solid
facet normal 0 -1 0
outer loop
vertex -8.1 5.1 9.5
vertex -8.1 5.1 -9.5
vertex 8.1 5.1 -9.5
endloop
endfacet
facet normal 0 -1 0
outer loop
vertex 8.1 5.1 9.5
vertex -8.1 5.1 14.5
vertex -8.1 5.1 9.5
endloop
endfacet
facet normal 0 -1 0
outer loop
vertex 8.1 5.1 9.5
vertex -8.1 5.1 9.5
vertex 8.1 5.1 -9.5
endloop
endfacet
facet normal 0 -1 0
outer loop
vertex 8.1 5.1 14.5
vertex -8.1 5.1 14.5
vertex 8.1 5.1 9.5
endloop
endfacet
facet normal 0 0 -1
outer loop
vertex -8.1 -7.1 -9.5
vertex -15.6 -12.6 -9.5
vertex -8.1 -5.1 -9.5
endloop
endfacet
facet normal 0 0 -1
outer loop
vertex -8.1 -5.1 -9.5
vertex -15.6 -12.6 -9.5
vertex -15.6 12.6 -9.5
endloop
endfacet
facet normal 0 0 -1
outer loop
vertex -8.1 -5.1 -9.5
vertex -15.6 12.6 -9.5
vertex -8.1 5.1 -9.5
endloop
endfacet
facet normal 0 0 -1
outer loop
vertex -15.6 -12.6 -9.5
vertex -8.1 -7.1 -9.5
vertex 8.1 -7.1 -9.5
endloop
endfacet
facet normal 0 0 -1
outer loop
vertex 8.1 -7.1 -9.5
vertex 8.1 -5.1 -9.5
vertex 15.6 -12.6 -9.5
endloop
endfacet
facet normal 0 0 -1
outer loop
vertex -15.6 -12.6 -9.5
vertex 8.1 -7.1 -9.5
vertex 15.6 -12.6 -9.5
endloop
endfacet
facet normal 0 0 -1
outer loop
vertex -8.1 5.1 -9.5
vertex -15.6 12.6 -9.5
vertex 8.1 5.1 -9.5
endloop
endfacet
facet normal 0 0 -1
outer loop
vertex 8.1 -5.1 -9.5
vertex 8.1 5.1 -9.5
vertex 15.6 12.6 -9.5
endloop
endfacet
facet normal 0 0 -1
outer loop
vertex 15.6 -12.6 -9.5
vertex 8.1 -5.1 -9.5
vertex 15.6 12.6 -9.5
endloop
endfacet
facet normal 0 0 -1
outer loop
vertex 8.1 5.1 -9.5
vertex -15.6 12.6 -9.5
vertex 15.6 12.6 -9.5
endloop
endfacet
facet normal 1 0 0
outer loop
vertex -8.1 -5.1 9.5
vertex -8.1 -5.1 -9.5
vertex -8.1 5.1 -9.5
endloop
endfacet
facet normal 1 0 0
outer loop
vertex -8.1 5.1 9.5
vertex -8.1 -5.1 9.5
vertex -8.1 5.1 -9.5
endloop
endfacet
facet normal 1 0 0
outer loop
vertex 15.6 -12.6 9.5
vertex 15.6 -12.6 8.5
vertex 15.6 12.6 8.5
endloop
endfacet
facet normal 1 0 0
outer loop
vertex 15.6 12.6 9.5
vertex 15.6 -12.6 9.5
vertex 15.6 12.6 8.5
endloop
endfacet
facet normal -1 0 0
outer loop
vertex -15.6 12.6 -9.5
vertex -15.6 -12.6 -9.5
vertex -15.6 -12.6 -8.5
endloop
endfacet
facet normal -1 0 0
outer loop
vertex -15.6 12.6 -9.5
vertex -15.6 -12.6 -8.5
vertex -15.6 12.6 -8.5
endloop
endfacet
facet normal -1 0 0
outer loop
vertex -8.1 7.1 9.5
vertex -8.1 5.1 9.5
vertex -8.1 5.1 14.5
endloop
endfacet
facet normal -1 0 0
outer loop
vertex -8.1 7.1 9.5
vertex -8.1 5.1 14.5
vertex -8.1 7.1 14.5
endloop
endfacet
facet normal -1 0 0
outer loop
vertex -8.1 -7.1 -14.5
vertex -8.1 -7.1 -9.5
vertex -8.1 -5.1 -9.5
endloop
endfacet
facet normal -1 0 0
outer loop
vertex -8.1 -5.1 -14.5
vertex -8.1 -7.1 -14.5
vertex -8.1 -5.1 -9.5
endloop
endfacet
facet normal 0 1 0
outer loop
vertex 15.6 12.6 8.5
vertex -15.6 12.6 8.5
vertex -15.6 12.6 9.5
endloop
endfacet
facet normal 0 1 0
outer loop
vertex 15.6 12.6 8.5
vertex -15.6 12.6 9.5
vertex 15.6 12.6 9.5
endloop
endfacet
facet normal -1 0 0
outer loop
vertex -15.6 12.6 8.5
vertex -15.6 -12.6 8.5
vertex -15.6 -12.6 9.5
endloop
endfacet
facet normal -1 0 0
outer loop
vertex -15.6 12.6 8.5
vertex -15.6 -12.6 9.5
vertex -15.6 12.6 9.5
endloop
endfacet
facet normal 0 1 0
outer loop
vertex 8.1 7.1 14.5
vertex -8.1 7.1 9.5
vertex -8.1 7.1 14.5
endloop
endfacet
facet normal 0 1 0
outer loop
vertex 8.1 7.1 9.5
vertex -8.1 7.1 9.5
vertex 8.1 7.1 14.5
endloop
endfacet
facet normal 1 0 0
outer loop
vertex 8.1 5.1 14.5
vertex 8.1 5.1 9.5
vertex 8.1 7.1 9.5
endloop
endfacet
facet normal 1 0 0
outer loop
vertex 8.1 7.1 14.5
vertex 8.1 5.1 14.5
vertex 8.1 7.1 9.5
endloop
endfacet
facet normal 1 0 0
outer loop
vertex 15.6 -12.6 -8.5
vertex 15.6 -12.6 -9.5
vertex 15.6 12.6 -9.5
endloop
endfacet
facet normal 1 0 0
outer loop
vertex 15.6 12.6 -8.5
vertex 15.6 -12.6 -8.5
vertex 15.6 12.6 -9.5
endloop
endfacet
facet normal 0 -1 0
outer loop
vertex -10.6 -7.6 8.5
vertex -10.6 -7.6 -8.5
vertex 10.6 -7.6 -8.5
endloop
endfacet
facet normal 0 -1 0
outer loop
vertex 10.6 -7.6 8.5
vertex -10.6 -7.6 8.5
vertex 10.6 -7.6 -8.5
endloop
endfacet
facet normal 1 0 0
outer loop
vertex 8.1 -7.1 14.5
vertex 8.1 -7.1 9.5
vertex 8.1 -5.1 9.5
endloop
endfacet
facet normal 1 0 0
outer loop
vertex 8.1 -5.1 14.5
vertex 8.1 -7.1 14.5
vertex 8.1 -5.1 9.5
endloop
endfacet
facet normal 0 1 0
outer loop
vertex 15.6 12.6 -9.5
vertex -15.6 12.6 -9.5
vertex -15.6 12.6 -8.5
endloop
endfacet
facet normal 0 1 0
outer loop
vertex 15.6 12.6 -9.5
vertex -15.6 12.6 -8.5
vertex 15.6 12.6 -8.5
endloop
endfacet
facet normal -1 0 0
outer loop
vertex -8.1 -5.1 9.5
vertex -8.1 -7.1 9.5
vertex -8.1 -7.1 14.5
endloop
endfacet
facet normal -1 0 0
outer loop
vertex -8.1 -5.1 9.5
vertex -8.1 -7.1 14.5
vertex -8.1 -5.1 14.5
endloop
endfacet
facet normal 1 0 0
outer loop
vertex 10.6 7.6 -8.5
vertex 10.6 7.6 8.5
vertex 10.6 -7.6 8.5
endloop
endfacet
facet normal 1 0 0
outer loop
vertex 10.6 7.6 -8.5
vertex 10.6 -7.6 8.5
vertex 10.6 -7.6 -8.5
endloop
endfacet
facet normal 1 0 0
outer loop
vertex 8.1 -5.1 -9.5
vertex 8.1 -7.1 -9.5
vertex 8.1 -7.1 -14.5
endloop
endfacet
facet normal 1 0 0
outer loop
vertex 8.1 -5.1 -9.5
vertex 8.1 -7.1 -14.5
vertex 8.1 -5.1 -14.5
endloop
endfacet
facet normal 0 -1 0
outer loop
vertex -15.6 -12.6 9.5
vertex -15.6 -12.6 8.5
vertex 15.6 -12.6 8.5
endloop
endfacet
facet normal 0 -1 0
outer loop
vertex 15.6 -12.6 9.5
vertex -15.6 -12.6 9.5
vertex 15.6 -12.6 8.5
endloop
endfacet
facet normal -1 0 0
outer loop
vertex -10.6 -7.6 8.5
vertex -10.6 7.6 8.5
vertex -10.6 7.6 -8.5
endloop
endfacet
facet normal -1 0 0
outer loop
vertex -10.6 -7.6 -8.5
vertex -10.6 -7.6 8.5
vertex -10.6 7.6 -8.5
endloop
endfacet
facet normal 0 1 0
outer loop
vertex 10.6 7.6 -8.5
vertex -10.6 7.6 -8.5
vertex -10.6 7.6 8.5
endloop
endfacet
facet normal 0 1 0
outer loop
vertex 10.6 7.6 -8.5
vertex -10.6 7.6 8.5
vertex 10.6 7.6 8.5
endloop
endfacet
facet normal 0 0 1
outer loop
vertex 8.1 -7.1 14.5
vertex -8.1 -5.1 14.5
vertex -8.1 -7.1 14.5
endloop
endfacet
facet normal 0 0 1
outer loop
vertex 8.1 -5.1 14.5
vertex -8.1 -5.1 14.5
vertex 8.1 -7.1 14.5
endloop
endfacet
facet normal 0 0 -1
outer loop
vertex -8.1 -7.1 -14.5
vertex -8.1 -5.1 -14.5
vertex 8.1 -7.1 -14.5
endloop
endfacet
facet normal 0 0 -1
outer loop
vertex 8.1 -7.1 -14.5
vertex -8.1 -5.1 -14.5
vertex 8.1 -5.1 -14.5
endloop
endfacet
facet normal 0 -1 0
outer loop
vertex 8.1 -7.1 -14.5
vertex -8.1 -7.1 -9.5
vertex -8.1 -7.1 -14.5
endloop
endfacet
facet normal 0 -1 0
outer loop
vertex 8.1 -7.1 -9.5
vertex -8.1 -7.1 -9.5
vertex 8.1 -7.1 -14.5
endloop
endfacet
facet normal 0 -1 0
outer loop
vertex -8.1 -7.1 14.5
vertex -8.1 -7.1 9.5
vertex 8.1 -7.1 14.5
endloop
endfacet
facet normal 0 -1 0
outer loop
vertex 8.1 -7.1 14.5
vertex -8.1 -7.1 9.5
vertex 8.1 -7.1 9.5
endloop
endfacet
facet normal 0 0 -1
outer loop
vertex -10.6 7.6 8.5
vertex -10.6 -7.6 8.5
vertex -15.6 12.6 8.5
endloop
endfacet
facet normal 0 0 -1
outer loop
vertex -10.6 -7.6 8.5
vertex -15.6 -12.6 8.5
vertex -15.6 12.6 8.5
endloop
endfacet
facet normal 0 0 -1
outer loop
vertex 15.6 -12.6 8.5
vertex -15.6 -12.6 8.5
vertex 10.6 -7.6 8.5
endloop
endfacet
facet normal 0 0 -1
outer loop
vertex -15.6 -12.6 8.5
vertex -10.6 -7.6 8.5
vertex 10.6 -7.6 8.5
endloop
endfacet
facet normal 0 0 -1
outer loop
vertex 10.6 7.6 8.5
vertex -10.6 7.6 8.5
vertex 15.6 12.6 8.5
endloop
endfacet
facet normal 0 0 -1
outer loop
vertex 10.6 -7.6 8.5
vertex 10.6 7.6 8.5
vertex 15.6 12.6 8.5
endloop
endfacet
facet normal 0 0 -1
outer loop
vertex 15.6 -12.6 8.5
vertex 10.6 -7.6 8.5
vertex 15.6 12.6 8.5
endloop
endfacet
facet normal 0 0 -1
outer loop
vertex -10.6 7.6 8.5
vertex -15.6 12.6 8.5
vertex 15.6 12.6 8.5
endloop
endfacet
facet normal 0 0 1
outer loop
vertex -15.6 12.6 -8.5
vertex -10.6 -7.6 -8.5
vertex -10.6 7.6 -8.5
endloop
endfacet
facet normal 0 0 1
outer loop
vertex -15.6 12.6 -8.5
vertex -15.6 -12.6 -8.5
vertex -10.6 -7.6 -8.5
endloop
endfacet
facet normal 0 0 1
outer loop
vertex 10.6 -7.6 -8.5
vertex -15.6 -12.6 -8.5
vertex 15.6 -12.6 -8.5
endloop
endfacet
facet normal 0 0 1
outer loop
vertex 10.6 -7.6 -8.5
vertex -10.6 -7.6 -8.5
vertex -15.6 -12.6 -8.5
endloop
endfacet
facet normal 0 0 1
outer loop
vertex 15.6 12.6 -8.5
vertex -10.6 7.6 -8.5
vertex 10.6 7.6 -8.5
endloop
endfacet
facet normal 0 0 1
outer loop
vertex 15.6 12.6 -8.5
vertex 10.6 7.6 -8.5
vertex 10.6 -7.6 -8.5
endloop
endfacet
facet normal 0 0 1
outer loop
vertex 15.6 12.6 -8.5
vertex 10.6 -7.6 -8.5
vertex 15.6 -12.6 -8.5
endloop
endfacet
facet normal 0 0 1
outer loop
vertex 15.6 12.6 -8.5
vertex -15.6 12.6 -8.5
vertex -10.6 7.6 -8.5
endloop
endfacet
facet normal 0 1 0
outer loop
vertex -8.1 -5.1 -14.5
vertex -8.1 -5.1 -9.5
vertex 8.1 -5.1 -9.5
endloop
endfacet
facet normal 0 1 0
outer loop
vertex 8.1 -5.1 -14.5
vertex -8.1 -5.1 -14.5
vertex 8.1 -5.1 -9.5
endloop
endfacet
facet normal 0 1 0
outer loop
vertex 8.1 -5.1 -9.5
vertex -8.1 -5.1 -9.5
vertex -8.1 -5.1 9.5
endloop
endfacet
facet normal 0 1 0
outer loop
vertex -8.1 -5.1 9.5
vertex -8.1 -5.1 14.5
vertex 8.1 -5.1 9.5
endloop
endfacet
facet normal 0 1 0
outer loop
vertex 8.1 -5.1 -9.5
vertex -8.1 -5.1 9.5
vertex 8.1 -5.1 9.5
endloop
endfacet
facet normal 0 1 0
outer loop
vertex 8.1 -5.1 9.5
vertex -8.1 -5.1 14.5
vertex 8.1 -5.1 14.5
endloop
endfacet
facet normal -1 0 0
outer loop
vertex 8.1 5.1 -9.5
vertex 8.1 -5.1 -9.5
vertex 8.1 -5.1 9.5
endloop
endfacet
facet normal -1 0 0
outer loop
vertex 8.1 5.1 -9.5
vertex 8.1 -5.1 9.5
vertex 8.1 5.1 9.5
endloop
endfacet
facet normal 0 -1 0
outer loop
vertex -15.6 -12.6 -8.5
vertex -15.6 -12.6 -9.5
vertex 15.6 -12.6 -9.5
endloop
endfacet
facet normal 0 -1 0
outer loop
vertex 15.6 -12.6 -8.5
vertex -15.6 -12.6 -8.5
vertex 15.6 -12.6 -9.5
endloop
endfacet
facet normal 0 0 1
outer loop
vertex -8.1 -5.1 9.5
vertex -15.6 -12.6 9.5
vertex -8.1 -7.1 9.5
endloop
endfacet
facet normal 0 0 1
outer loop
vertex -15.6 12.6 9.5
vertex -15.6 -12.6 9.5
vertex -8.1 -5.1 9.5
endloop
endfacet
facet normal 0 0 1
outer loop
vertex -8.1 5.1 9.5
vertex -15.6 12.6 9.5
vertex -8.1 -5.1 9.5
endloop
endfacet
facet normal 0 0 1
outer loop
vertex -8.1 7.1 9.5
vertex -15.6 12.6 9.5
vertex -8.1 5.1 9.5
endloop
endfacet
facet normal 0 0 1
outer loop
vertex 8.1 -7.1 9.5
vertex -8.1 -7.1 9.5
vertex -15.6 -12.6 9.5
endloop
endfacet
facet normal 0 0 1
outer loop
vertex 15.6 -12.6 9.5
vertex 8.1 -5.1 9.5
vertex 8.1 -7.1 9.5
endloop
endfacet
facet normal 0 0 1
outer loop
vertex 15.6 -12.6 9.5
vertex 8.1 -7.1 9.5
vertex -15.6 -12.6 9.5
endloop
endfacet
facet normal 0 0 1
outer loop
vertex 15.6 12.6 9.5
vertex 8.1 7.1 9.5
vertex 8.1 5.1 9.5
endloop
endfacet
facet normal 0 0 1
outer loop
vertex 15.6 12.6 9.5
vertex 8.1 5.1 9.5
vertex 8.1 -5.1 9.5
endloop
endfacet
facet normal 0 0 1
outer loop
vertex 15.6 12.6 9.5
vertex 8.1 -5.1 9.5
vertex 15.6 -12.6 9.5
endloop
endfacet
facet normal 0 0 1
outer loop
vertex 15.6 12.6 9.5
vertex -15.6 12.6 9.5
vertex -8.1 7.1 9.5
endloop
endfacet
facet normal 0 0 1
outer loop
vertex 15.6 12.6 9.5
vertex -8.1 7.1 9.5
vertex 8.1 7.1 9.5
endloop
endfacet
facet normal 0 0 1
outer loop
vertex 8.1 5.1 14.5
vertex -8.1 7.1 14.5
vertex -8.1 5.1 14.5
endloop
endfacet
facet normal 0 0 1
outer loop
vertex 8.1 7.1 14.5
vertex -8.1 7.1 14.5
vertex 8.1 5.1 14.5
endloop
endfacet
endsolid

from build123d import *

# Parameters (mm, degrees)
BOSS_EXTRUDE1_DEPTH      = 9.5
BOSS_EXTRUDE1_DEPTH_BACK = 9.5
SKETCH1_W                = 31.2
SKETCH1_H                = 25.2
SKETCH1_W_2              = 16.2
SKETCH1_H_2              = 10.2
SKETCH2_W                = 31.2
SKETCH2_H                = 17
CUT_EXTRUDE1_DEPTH       = 5
SKETCH3_W                = 17
SKETCH3_H                = 15.2
CUT_EXTRUDE2_DEPTH       = 5
SKETCH4_W                = 16.2
SKETCH4_H                = 2
BOSS_EXTRUDE2_DEPTH      = 5
SKETCH6_W                = 16.2
SKETCH6_H                = 5
CUT_EXTRUDE3_DEPTH       = 2


with BuildPart() as part:
    # Sketch1 → Boss-Extrude1 (new, two sides: drawn at the far end of the back side and taken through both)
    with BuildSketch(Plane.XY.offset(-BOSS_EXTRUDE1_DEPTH_BACK)):
        Rectangle(SKETCH1_W, SKETCH1_H)
        Rectangle(SKETCH1_W_2, SKETCH1_H_2, mode=Mode.SUBTRACT)
    extrude(amount=BOSS_EXTRUDE1_DEPTH + BOSS_EXTRUDE1_DEPTH_BACK)

    # Sketch2 → Cut-Extrude1 (cut)
    with BuildSketch(Plane(origin=(0, 12.6, 0), x_dir=(1, 0, 0), z_dir=(0, 1, 0))):
        Rectangle(SKETCH2_W, SKETCH2_H)
    cut_extrude1 = extrude(amount=-CUT_EXTRUDE1_DEPTH, mode=Mode.SUBTRACT)

    # Mirror1: Cut-Extrude1 across plane
    add(cut_extrude1.mirror(Plane.ZX), mode=Mode.SUBTRACT)

    # Sketch3 → Cut-Extrude2 (cut)
    with BuildSketch(Plane(origin=(15.6, 0, 0), x_dir=(0, 0, -1), z_dir=(1, 0, 0))):
        Rectangle(SKETCH3_W, SKETCH3_H)
    cut_extrude2 = extrude(amount=-CUT_EXTRUDE2_DEPTH, mode=Mode.SUBTRACT)

    # Mirror2: Cut-Extrude2 across plane
    add(cut_extrude2.mirror(Plane(origin=(0, 0, 0), x_dir=(0, 0, 1), z_dir=(1, 0, 0))), mode=Mode.SUBTRACT)

    # Sketch4 → Boss-Extrude2 (add)
    with BuildSketch(Plane.XY.offset(9.5)):
        with Locations((0, 6.1)):
            Rectangle(SKETCH4_W, SKETCH4_H)
        with Locations((0, -6.1)):
            Rectangle(SKETCH4_W, SKETCH4_H)
    boss_extrude2 = extrude(amount=BOSS_EXTRUDE2_DEPTH)

    # Mirror3: Boss-Extrude2 across plane
    add(boss_extrude2.mirror(Plane.XY))

    # Sketch6 → Cut-Extrude3 (cut)
    with BuildSketch(Plane(origin=(0, 7.1, 0), x_dir=(1, 0, 0), z_dir=(0, 1, 0))):
        with Locations((0, 12)):
            Rectangle(SKETCH6_W, SKETCH6_H)
    extrude(amount=-CUT_EXTRUDE3_DEPTH, mode=Mode.SUBTRACT)


solid = part.part
